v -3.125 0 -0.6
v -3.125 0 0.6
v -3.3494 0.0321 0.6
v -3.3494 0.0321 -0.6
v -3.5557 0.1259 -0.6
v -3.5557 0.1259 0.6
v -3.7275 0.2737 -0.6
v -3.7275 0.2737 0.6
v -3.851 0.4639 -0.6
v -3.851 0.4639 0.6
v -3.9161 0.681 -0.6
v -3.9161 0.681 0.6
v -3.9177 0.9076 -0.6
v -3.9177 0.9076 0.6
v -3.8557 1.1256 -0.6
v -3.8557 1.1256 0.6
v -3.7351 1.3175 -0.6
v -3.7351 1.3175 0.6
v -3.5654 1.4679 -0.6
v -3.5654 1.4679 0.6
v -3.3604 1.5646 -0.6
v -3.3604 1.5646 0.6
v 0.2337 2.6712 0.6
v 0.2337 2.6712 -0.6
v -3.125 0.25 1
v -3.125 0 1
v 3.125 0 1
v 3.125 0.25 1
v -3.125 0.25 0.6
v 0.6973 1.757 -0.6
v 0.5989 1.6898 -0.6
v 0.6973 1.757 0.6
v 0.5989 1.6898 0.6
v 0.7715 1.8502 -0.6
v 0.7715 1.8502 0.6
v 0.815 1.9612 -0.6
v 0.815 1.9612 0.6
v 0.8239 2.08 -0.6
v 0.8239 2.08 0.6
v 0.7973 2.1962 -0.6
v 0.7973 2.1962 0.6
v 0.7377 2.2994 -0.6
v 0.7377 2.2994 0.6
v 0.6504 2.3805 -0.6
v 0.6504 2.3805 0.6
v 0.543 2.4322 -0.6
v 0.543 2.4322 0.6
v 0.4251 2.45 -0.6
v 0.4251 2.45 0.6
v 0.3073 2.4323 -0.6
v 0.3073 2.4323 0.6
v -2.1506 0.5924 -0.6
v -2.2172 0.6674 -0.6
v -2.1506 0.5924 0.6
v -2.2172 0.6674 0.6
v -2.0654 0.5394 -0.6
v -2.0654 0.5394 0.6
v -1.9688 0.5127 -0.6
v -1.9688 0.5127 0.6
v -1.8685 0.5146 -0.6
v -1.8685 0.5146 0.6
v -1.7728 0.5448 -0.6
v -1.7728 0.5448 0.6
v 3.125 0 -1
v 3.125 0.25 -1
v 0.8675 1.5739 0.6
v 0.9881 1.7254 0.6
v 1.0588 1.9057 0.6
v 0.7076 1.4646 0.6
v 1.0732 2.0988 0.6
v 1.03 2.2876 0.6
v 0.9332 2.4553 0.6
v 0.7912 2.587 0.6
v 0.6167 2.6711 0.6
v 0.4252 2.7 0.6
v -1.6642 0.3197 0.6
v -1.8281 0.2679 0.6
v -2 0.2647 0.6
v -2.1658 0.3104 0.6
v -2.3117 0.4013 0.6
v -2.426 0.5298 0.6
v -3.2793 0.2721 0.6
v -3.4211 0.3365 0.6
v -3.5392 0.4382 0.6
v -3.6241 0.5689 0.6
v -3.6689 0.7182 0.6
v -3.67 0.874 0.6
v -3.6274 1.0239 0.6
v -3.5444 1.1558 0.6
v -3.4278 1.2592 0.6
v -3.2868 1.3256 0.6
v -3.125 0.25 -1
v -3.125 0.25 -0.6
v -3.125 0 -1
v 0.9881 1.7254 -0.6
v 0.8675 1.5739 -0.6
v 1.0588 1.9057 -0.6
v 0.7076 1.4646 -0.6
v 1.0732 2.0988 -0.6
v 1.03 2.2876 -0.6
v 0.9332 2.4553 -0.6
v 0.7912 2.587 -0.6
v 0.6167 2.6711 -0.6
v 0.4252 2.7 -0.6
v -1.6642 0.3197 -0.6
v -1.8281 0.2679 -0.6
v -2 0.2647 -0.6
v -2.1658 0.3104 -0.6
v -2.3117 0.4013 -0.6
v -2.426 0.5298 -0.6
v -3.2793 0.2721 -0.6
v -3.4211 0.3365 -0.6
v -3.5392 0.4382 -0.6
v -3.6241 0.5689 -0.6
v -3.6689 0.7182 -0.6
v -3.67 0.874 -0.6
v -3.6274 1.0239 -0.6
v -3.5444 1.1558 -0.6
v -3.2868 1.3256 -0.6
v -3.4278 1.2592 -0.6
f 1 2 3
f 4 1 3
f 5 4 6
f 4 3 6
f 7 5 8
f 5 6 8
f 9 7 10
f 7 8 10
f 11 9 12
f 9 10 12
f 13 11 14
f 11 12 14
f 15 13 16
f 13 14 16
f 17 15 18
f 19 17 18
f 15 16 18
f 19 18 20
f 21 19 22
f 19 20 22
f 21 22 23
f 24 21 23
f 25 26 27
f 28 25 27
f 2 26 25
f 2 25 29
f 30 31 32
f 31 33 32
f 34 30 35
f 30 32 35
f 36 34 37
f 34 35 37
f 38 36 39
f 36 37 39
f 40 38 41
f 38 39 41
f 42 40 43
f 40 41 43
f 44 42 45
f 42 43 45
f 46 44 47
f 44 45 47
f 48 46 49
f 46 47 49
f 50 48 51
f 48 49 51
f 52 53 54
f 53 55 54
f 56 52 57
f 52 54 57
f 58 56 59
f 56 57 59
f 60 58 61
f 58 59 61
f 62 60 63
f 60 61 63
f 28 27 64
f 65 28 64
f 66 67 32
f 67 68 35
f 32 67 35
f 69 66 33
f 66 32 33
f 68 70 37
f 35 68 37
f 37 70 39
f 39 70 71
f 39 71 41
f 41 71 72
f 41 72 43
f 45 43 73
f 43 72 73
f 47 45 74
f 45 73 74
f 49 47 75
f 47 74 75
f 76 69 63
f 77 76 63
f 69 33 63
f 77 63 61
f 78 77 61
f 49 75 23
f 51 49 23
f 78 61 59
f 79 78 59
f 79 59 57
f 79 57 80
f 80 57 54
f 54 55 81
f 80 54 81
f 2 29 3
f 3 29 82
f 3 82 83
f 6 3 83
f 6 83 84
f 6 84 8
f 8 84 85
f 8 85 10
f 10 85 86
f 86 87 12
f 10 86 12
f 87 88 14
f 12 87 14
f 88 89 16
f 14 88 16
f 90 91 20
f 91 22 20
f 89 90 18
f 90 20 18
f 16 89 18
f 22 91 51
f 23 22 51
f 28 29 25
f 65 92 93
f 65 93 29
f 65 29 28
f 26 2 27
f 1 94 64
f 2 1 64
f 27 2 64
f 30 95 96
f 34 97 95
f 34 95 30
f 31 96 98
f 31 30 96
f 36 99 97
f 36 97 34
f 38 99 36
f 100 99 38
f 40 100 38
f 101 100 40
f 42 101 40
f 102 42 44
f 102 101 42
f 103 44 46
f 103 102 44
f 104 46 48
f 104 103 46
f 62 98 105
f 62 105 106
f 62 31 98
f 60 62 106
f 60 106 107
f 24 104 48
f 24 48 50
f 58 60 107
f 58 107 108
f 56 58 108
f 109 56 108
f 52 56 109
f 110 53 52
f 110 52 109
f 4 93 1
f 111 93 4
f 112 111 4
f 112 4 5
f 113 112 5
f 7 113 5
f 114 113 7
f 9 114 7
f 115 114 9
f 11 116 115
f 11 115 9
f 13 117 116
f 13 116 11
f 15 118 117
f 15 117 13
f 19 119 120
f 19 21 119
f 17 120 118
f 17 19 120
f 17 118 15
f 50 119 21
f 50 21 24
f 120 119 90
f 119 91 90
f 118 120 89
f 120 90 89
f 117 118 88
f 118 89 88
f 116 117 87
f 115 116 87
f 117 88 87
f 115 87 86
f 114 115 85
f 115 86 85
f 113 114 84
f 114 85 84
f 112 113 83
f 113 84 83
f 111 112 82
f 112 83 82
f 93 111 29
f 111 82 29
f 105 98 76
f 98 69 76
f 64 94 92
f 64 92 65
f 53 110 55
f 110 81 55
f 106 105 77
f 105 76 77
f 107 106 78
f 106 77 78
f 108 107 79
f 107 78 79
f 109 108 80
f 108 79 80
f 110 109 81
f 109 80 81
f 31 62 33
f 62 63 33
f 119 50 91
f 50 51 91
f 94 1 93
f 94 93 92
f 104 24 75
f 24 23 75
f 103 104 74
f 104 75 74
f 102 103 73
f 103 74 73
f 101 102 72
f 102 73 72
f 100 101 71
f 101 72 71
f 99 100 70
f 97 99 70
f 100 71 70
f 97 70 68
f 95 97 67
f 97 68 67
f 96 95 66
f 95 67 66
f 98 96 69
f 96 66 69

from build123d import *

# Parameters (mm, degrees)
SKETCH_1_W       = 6.25
SKETCH_1_H       = 2
EXTRUDE_1_DEPTH  = 0.25
EXTRUDE_10_DEPTH = 0.6


with BuildPart() as part:
    # Эскиз1 → Бобышка-Вытянуть1 (new body)
    with BuildSketch(Plane(origin=(0, 0, 0), x_dir=(1, 0, 0), z_dir=(0, 1, 0))):
        Rectangle(SKETCH_1_W, SKETCH_1_H)
    extrude(amount=EXTRUDE_1_DEPTH)

    # Эскиз2 → Бобышка-Вытянуть10 (add, symmetric)
    with BuildSketch(Plane.XY):
        with BuildLine():
            Line((-3.360414863, 1.564578212), (0.233725424, 2.671219797))
            ThreePointArc((0.233725424, 2.671219797), (1.030014488, 2.287607806), (0.707586035, 1.464641022))
            Line((0.707586035, 1.464641022), (-1.664151352, 0.319668636))
            ThreePointArc((-1.664151352, 0.319668636), (-2.084532595, 0.281597587), (-2.425958589, 0.529787202))
            Line((-2.425958589, 0.529787202), (-2.217225844, 0.667375868))
            ThreePointArc((-2.217225844, 0.667375868), (-2.018060681, 0.522598593), (-1.772838289, 0.544806704))
            Line((-1.772838289, 0.544806704), (0.598899099, 1.689779091))
            ThreePointArc((0.598899099, 1.689779091), (0.797316608, 2.196220188), (0.307292568, 2.432289106))
            Line((0.307292568, 2.432289106), (-3.286847719, 1.325647521))
            ThreePointArc((-3.286847719, 1.325647521), (-3.668877806, 0.718165216), (-3.125, 0.25))
            Line((-3.125, 0.25), (-3.125, 0))
            ThreePointArc((-3.125, 0), (-3.916094991, 0.680967587), (-3.360414863, 1.564578212))
        make_face()
    extrude(amount=EXTRUDE_10_DEPTH, both=True)


solid = part.part
